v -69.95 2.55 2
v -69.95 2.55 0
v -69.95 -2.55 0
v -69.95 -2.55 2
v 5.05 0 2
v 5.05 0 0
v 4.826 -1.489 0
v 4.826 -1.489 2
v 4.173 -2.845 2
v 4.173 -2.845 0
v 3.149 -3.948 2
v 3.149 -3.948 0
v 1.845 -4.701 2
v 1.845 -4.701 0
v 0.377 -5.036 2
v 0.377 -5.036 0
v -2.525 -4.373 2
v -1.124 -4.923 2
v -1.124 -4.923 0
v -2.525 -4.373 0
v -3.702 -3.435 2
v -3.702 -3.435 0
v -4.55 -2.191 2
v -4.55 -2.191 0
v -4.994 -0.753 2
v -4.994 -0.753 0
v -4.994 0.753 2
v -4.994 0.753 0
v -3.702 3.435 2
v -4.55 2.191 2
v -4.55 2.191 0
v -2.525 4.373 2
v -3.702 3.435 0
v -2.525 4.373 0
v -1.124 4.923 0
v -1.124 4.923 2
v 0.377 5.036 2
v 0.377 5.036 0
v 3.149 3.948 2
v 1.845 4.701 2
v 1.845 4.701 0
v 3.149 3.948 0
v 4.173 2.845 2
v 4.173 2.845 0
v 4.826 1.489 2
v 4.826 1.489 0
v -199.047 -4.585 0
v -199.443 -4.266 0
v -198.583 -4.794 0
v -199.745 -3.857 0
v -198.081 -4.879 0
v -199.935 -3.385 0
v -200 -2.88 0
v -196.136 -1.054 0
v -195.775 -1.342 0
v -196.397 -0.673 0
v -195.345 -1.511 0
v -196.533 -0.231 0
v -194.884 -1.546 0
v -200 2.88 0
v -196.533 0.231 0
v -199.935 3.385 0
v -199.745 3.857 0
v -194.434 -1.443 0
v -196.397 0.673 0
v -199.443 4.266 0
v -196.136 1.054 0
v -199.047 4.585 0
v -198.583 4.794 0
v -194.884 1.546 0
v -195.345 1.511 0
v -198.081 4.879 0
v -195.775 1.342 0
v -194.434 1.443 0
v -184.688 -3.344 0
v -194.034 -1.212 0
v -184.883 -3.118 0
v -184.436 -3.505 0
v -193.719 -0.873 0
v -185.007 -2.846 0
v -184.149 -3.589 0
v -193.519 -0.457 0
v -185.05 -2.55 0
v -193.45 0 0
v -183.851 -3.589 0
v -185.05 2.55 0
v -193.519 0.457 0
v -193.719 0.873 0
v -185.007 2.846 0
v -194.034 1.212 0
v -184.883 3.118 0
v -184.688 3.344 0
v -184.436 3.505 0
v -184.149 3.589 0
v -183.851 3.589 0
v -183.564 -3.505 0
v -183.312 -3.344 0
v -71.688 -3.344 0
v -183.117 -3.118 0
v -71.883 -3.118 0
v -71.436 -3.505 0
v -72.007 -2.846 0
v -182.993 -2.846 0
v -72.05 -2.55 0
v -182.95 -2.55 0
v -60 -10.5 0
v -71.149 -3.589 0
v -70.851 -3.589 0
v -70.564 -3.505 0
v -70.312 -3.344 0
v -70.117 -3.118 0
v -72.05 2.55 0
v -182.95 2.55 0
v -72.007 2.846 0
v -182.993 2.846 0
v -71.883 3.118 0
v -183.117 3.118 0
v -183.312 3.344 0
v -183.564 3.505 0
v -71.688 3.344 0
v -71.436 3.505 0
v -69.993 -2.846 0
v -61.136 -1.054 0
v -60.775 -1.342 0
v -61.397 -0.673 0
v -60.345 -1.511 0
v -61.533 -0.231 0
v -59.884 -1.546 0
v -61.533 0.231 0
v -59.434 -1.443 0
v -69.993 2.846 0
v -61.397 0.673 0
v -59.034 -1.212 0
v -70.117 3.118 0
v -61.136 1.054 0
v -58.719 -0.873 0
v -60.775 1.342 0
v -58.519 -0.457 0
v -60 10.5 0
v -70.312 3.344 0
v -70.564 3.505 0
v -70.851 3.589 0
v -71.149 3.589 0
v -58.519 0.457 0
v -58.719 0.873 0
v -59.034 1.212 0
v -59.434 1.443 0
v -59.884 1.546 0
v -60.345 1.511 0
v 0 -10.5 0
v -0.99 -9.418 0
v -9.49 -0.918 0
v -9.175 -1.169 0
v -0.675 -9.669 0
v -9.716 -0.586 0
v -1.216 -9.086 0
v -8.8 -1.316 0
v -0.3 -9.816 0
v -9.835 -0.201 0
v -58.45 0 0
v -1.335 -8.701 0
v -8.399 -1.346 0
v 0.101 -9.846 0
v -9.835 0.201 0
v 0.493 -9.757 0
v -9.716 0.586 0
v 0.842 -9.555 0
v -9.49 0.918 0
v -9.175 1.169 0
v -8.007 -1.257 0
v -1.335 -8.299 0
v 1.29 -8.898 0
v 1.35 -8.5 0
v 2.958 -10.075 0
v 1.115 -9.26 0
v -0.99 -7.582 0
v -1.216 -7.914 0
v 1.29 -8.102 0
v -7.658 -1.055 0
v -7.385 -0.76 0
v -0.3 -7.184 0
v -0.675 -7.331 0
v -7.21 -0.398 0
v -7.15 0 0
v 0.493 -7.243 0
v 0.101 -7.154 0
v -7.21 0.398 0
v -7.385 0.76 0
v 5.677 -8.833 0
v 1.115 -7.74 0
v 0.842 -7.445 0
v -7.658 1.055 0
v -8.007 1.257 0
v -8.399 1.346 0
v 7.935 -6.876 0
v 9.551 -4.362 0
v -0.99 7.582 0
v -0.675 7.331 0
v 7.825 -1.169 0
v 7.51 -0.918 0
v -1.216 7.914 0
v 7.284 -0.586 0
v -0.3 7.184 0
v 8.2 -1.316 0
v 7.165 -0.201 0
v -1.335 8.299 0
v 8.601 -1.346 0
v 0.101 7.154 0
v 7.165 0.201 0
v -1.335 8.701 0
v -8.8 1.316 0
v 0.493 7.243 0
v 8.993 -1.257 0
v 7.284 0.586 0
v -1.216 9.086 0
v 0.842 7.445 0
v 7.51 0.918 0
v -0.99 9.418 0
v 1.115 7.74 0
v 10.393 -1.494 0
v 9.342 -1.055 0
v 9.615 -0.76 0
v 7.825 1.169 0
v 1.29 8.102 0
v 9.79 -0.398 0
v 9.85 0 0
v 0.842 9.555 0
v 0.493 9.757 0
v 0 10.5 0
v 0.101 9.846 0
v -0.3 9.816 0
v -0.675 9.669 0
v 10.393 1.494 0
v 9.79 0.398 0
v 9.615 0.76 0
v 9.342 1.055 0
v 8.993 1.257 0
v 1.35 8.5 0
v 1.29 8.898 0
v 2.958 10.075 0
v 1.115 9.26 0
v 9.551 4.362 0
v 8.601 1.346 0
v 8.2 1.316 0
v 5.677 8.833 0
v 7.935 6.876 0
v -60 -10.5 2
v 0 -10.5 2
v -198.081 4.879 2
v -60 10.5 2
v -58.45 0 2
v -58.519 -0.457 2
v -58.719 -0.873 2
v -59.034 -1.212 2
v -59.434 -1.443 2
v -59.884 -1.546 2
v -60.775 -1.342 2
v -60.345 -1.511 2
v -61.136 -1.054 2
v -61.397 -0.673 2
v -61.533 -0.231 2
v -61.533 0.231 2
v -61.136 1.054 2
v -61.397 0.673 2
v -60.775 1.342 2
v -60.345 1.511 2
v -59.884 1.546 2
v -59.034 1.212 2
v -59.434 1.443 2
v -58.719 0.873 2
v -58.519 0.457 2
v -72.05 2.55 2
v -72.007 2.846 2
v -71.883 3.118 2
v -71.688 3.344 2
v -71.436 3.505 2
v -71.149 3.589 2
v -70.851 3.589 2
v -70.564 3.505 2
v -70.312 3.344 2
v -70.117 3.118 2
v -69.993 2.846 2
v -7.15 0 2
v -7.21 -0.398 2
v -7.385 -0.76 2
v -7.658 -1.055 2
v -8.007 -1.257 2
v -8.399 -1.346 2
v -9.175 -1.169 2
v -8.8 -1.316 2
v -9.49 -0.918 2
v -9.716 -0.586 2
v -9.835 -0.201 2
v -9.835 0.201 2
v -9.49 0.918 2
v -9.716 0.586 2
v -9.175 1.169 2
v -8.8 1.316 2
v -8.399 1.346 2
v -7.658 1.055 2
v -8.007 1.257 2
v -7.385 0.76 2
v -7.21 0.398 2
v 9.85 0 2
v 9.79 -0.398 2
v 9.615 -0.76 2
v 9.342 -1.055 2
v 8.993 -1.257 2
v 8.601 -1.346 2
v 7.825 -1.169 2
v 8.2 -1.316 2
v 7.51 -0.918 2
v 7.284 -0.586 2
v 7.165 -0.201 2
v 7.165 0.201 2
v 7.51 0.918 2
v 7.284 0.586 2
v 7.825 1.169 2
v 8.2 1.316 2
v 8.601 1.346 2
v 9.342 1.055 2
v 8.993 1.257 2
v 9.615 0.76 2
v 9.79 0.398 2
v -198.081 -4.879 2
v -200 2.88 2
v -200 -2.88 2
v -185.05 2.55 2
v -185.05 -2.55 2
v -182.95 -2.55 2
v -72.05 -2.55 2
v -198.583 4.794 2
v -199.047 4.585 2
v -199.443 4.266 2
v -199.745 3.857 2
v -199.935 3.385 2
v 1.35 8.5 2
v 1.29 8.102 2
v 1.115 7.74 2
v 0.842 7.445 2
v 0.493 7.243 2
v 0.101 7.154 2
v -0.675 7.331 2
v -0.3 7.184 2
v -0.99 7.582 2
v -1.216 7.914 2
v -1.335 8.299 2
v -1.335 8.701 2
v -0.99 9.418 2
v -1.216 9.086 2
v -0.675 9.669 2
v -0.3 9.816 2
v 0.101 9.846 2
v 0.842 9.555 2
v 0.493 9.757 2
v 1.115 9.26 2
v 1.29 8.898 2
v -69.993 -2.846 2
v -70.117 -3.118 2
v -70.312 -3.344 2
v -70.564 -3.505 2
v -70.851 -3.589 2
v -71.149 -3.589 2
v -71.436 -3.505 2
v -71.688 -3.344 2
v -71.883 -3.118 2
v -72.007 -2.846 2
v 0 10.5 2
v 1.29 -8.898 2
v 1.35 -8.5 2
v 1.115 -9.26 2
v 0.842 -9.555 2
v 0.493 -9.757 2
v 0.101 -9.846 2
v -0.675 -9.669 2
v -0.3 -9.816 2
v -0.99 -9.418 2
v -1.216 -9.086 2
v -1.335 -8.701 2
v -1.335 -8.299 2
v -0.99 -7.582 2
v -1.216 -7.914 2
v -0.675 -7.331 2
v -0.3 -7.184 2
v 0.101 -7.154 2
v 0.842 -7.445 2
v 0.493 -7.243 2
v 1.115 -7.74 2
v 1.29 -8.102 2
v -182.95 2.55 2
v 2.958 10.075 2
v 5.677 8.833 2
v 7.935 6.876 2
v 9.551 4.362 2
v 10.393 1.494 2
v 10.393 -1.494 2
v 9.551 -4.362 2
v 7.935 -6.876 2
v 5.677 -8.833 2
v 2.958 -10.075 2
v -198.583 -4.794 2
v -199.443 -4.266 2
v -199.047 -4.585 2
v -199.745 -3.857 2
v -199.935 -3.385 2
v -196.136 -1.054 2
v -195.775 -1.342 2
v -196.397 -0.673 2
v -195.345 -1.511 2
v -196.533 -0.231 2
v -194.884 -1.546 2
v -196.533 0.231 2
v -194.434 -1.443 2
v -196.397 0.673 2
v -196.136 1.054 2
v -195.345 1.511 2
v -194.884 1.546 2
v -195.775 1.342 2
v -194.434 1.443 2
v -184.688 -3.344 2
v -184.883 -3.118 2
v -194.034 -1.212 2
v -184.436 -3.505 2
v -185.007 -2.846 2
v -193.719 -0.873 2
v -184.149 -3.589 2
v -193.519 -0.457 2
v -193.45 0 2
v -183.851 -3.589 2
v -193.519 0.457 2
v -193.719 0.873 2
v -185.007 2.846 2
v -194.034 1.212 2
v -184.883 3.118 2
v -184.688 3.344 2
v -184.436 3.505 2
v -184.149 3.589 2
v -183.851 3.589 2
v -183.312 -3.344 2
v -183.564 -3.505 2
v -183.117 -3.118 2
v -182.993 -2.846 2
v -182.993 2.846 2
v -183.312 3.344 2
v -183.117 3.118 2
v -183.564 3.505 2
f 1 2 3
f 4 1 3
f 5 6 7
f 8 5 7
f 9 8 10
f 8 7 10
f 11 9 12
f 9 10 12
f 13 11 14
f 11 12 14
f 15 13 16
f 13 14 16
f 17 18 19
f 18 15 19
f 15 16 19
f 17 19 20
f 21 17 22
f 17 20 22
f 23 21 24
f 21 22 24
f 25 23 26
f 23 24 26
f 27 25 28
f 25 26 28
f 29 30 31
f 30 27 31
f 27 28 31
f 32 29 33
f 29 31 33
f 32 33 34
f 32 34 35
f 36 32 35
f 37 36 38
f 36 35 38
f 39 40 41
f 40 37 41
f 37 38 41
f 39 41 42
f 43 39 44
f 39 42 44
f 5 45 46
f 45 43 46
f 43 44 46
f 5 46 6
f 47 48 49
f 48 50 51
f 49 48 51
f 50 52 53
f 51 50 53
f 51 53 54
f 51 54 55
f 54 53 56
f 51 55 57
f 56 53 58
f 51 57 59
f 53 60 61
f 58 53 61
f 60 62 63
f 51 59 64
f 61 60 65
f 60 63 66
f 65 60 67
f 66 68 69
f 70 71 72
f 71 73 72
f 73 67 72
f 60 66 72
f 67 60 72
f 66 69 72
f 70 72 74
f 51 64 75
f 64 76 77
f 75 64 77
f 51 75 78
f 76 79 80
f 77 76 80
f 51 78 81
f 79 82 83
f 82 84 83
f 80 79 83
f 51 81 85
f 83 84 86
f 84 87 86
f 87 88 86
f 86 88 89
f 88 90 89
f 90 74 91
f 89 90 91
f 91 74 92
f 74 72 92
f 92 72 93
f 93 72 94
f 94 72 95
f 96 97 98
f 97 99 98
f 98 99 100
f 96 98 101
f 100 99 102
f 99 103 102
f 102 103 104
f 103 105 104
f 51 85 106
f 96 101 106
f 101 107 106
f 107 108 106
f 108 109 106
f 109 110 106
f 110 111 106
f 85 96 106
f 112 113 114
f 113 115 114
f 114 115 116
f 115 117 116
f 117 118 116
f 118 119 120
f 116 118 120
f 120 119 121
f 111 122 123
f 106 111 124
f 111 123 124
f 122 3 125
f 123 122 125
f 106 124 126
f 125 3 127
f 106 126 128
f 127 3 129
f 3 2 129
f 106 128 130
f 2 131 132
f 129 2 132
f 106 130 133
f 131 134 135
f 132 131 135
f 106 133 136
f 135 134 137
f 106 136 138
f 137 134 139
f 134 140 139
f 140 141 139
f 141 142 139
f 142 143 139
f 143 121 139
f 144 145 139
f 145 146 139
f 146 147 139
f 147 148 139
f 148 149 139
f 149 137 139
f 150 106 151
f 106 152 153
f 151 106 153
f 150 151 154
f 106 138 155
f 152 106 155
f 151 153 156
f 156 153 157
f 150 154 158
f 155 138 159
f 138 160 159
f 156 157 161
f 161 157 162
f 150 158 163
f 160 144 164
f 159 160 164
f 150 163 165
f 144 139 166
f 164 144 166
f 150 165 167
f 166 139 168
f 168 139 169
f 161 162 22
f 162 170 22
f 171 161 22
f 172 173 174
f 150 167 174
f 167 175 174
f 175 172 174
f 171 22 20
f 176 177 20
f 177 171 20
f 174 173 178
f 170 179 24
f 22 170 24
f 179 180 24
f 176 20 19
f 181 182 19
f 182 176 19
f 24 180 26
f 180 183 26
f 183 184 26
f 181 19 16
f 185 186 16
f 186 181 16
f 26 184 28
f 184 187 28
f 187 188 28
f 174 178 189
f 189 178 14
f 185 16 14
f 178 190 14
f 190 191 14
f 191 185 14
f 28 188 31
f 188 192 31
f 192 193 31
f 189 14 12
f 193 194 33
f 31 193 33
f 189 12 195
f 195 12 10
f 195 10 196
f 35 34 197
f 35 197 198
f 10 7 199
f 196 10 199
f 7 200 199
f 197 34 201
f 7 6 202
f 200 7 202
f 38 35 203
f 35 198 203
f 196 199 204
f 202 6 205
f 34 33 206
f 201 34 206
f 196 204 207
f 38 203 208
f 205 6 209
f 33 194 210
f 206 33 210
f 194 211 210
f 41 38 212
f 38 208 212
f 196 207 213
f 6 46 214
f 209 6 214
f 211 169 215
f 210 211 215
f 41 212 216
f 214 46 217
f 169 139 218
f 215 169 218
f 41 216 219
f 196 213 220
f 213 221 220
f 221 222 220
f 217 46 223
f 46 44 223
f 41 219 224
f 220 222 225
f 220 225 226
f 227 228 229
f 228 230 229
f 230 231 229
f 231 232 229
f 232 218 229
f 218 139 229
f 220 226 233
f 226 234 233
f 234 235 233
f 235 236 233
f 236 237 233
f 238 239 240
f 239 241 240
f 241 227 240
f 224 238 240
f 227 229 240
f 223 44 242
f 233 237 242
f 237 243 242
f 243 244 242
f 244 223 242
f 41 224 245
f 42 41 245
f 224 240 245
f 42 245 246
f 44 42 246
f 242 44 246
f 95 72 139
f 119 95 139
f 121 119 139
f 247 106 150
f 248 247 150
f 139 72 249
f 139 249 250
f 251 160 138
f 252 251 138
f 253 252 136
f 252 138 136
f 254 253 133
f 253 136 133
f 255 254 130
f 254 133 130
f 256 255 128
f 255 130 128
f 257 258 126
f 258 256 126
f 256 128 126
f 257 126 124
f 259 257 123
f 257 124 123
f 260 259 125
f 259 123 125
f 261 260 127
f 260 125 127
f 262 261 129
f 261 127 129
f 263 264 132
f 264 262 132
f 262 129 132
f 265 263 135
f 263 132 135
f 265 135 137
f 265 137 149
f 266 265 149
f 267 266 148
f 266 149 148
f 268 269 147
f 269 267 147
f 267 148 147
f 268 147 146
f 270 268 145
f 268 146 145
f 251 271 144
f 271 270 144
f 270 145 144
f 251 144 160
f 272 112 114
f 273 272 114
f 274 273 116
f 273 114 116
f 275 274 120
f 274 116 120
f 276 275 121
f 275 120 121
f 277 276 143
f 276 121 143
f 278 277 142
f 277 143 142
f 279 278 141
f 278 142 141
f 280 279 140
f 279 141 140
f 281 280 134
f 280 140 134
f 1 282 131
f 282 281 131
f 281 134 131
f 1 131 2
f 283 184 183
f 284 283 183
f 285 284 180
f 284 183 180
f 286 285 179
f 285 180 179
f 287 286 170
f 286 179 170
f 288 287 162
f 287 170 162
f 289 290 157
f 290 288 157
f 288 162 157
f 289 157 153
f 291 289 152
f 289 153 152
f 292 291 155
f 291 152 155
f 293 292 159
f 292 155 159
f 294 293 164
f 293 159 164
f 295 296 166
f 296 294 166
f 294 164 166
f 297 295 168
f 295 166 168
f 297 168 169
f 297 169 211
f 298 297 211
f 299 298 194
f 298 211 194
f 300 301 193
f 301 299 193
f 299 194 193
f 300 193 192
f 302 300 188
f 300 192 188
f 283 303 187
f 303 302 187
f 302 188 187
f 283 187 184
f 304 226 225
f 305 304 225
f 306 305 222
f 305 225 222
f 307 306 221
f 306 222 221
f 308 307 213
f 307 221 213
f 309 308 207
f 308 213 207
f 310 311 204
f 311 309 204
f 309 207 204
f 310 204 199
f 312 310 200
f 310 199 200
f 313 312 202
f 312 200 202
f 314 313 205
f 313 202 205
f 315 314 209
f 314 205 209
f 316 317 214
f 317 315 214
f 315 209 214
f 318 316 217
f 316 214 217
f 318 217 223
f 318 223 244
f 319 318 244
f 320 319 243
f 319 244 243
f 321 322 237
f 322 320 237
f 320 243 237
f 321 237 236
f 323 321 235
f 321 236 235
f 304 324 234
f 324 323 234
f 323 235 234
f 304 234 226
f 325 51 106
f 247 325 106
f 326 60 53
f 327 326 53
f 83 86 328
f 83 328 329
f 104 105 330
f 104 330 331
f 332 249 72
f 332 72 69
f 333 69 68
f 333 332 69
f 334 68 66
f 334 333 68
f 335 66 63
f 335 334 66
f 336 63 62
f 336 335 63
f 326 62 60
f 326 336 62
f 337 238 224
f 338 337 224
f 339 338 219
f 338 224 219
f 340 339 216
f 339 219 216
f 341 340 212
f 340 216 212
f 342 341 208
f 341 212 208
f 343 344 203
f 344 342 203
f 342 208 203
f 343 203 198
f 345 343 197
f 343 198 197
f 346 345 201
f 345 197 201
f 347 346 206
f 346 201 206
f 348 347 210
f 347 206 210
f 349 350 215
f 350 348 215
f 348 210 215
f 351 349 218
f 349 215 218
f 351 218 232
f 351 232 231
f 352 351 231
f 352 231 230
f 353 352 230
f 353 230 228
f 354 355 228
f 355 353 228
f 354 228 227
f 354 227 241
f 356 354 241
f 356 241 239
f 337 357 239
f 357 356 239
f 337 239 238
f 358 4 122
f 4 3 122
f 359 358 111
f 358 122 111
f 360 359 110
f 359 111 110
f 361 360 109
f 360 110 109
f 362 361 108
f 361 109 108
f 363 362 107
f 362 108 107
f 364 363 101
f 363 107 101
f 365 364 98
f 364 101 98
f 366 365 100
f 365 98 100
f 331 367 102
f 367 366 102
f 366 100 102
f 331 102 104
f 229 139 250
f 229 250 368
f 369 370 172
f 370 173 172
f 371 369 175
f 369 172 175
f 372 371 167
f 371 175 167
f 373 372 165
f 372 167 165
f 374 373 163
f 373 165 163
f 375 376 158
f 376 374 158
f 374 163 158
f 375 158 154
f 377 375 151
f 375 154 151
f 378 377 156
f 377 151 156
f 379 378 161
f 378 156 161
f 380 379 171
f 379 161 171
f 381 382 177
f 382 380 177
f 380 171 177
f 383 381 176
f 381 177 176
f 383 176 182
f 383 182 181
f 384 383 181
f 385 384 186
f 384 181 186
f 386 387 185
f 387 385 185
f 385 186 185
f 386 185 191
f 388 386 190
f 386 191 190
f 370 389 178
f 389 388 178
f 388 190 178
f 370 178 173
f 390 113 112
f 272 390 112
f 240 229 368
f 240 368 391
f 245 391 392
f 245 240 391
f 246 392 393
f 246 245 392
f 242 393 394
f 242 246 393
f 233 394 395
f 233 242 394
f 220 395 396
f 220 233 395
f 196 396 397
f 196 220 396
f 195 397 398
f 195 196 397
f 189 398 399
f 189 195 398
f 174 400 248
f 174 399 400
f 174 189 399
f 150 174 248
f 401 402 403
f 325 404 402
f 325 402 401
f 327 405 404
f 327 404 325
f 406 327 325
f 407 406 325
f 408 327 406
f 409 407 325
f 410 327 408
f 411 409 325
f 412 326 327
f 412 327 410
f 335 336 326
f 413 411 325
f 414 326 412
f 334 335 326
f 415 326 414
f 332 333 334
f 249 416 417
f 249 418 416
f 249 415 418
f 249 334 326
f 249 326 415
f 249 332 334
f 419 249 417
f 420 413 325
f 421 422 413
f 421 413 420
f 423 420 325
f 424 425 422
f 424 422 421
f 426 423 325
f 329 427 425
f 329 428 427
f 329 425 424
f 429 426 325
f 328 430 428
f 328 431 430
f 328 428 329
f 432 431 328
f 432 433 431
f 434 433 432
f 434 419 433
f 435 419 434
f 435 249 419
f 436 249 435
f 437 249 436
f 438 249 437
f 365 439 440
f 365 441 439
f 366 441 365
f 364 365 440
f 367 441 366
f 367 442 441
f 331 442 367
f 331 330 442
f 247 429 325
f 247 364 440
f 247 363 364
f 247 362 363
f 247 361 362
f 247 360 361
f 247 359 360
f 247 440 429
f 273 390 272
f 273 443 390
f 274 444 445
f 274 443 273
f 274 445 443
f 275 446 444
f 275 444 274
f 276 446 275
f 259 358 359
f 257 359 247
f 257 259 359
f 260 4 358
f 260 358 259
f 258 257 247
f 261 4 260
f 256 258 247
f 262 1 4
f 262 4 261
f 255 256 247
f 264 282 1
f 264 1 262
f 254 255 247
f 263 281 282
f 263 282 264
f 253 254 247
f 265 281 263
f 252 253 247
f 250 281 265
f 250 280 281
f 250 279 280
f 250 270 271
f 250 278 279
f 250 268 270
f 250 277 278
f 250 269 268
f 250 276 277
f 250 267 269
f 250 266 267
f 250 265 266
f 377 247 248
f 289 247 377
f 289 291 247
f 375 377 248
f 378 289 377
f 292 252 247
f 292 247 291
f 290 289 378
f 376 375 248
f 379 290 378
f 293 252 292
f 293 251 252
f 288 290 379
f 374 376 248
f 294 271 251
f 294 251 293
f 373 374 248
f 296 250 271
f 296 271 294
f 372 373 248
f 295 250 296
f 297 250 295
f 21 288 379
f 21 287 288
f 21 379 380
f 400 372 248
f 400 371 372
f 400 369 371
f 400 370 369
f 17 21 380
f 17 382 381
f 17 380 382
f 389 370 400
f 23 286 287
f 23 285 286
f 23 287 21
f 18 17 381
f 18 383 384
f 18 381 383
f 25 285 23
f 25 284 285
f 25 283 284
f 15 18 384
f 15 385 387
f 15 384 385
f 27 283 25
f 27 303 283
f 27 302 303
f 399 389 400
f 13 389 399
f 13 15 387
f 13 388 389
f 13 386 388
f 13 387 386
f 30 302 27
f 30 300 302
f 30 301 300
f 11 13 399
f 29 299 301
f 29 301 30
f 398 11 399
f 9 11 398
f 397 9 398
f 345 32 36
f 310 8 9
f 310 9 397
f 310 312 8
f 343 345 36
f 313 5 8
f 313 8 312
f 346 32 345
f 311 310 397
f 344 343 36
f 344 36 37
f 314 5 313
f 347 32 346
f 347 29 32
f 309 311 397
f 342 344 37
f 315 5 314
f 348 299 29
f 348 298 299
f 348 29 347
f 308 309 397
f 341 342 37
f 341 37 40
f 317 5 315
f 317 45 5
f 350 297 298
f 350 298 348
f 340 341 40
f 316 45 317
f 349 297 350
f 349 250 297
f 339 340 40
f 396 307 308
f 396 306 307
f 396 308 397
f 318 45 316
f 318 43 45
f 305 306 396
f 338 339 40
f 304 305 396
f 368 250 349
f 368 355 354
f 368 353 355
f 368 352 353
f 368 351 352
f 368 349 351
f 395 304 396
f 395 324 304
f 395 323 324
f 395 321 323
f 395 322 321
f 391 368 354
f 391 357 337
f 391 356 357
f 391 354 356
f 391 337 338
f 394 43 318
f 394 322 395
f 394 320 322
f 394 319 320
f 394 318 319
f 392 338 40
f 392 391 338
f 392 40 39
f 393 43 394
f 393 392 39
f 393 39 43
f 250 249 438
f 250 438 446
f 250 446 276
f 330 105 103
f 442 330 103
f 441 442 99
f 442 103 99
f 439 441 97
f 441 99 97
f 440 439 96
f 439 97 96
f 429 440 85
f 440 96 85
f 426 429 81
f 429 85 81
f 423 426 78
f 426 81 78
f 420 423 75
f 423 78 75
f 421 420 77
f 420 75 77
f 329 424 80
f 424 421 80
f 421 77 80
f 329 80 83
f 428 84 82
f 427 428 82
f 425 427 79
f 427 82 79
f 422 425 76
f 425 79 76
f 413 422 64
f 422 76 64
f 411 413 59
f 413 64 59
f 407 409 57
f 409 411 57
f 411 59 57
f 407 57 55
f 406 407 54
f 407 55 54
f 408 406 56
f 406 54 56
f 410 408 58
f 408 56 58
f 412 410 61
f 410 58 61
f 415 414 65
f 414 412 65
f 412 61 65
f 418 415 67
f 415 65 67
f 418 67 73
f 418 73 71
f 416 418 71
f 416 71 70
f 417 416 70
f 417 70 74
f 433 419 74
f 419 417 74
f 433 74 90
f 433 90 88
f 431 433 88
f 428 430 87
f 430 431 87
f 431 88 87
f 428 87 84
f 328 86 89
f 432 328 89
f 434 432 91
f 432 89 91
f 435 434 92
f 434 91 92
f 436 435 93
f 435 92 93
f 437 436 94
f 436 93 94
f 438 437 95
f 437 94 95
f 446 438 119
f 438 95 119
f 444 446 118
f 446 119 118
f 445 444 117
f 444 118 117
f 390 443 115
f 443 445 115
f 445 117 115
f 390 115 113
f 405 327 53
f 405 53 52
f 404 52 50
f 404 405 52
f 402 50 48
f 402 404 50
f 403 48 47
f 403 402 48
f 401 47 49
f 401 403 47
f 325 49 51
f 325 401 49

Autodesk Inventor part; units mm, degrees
ref_plane "YZ Plane" through (0, 0, 0) normal (1, 0, 0) x (0, 1, 0)
ref_plane "XZ Plane" through (0, 0, 0) normal (0, 1, 0) x (-1, 0, 0)
ref_plane "XY Plane" through (0, 0, 0) normal (0, 0, 1) x (1, 0, 0)
sketch "スケッチ1" plane through (0, 0, 0) normal (0, 0, 1) x (1, 0, 0)
  circle A0 centre (0, 0) radius 10.5 construction
  line L0 (0, 10.5) -> (-200, 10.5) construction
  line L1 (-200, 10.5) -> (-200, -10.5) construction
  line L2 (-200, -10.5) -> (0, -10.5) construction
  circle A1 centre (-195, 0) radius 1.55
  line L3 (-185, 2.5) -> (-70, 2.5) construction
  line L4 (-70, 2.5) -> (-70, -2.5) construction
  line L5 (-70, -2.5) -> (-185, -2.5) construction
  line L6 (-185, -2.5) -> (-185, 2.5) construction
  line L7 (-127.5, 2.5) -> (-127.5, -2.5) construction
  circle A2 centre (-60, 0) radius 1.55
  line L8 (-12, 21.3027) -> (-12, -27.3903) construction
  line L9 (-69.95, 2.55) -> (-185.05, 2.55) construction
  line L10 (-185.05, 2.55) -> (-185.05, -2.55) construction
  line L11 (-185.05, -2.55) -> (-69.95, -2.55) construction
  line L12 (-69.95, -2.55) -> (-69.95, 2.55) construction
  circle A3 centre (-184, 2.55) radius 1.05 construction
  line L13 (-185, 0) -> (-127.5, 0) construction
  line L14 (-185.05, 2.55) -> (-185.05, -2.55)
  arc A4 (-182.95, 2.55) -> (-185.05, 2.55) centre (-184, 2.55) ccw
  line L15 (-182.95, 2.55) -> (-72.05, 2.55)
  arc A5 (-69.95, 2.55) -> (-72.05, 2.55) centre (-71, 2.55) ccw
  line L16 (-69.95, 2.55) -> (-69.95, -2.55)
  arc A6 (-185.05, -2.55) -> (-182.95, -2.55) centre (-184, -2.55) ccw
  line L17 (-182.95, -2.55) -> (-72.05, -2.55)
  arc A7 (-72.05, -2.55) -> (-69.95, -2.55) centre (-71, -2.55) ccw
  circle A8 centre (0, 8.5) radius 1.35
  circle A9 centre (0, 0) radius 5.05
  circle A10 centre (-8.5, 0) radius 1.35
  circle A11 centre (0, -8.5) radius 1.35
  circle A12 centre (8.5, 0) radius 1.35
  line L18 (-200, 4.8006) -> (-200, -4.8006)
  line L19 (-200, 4.8006) -> (-60, 10.5)
  line L20 (-60, 10.5) -> (0, 10.5)
  line L21 (-200, -4.8006) -> (-60, -10.5)
  line L22 (-60, -10.5) -> (0, -10.5)
  arc A13 (0, -10.5) -> (0, 10.5) centre (0, 0) ccw
  circle A14 centre (-195, 0) radius 5 construction
  point P0 (-200, 0)
  dimension "d9" = 2.1
  dimension "d0" = 200
  dimension "d1" = 3.1
  dimension "d2" = 21
  dimension "d3" = 10
  dimension "d4" = 5
  dimension "d5" = 12
  dimension "d6" = 135
  dimension "d7" = 5
  dimension "d8" = 0.05
  dimension "d10" = 2.7
  dimension "d11" = 8.5
  dimension "d12" = 10.1
  dimension "d15" = 360
extrude "押し出し1" add sketch "スケッチ1" along normal blind 2
fillet "フィレット1" radius 2 2 edges at (-200, -4.8006, 1) (-200, 4.8006, 1)
equation "\"H_head\" = 28.5"
equation "\"H_leg\" = 199.5"
equation "\"足の面積\" = 12720.125"
equation "\"現在の面積\" = 11560"
equation "\"足_短辺\" = 68"
equation "\"円柱\" = 313.5"
equation "\"胴体中心から手先\" = 342"
equation "\"H_leg_1\" = 186.2"
equation "\"H_leg_MAX\" = 399"
equation "\"H_head_1\" = 26.6"
equation "\"H_head_MAX\" = 142.5"
properties part number "前腕_メインフレーム_1_1" material "GFRP"
